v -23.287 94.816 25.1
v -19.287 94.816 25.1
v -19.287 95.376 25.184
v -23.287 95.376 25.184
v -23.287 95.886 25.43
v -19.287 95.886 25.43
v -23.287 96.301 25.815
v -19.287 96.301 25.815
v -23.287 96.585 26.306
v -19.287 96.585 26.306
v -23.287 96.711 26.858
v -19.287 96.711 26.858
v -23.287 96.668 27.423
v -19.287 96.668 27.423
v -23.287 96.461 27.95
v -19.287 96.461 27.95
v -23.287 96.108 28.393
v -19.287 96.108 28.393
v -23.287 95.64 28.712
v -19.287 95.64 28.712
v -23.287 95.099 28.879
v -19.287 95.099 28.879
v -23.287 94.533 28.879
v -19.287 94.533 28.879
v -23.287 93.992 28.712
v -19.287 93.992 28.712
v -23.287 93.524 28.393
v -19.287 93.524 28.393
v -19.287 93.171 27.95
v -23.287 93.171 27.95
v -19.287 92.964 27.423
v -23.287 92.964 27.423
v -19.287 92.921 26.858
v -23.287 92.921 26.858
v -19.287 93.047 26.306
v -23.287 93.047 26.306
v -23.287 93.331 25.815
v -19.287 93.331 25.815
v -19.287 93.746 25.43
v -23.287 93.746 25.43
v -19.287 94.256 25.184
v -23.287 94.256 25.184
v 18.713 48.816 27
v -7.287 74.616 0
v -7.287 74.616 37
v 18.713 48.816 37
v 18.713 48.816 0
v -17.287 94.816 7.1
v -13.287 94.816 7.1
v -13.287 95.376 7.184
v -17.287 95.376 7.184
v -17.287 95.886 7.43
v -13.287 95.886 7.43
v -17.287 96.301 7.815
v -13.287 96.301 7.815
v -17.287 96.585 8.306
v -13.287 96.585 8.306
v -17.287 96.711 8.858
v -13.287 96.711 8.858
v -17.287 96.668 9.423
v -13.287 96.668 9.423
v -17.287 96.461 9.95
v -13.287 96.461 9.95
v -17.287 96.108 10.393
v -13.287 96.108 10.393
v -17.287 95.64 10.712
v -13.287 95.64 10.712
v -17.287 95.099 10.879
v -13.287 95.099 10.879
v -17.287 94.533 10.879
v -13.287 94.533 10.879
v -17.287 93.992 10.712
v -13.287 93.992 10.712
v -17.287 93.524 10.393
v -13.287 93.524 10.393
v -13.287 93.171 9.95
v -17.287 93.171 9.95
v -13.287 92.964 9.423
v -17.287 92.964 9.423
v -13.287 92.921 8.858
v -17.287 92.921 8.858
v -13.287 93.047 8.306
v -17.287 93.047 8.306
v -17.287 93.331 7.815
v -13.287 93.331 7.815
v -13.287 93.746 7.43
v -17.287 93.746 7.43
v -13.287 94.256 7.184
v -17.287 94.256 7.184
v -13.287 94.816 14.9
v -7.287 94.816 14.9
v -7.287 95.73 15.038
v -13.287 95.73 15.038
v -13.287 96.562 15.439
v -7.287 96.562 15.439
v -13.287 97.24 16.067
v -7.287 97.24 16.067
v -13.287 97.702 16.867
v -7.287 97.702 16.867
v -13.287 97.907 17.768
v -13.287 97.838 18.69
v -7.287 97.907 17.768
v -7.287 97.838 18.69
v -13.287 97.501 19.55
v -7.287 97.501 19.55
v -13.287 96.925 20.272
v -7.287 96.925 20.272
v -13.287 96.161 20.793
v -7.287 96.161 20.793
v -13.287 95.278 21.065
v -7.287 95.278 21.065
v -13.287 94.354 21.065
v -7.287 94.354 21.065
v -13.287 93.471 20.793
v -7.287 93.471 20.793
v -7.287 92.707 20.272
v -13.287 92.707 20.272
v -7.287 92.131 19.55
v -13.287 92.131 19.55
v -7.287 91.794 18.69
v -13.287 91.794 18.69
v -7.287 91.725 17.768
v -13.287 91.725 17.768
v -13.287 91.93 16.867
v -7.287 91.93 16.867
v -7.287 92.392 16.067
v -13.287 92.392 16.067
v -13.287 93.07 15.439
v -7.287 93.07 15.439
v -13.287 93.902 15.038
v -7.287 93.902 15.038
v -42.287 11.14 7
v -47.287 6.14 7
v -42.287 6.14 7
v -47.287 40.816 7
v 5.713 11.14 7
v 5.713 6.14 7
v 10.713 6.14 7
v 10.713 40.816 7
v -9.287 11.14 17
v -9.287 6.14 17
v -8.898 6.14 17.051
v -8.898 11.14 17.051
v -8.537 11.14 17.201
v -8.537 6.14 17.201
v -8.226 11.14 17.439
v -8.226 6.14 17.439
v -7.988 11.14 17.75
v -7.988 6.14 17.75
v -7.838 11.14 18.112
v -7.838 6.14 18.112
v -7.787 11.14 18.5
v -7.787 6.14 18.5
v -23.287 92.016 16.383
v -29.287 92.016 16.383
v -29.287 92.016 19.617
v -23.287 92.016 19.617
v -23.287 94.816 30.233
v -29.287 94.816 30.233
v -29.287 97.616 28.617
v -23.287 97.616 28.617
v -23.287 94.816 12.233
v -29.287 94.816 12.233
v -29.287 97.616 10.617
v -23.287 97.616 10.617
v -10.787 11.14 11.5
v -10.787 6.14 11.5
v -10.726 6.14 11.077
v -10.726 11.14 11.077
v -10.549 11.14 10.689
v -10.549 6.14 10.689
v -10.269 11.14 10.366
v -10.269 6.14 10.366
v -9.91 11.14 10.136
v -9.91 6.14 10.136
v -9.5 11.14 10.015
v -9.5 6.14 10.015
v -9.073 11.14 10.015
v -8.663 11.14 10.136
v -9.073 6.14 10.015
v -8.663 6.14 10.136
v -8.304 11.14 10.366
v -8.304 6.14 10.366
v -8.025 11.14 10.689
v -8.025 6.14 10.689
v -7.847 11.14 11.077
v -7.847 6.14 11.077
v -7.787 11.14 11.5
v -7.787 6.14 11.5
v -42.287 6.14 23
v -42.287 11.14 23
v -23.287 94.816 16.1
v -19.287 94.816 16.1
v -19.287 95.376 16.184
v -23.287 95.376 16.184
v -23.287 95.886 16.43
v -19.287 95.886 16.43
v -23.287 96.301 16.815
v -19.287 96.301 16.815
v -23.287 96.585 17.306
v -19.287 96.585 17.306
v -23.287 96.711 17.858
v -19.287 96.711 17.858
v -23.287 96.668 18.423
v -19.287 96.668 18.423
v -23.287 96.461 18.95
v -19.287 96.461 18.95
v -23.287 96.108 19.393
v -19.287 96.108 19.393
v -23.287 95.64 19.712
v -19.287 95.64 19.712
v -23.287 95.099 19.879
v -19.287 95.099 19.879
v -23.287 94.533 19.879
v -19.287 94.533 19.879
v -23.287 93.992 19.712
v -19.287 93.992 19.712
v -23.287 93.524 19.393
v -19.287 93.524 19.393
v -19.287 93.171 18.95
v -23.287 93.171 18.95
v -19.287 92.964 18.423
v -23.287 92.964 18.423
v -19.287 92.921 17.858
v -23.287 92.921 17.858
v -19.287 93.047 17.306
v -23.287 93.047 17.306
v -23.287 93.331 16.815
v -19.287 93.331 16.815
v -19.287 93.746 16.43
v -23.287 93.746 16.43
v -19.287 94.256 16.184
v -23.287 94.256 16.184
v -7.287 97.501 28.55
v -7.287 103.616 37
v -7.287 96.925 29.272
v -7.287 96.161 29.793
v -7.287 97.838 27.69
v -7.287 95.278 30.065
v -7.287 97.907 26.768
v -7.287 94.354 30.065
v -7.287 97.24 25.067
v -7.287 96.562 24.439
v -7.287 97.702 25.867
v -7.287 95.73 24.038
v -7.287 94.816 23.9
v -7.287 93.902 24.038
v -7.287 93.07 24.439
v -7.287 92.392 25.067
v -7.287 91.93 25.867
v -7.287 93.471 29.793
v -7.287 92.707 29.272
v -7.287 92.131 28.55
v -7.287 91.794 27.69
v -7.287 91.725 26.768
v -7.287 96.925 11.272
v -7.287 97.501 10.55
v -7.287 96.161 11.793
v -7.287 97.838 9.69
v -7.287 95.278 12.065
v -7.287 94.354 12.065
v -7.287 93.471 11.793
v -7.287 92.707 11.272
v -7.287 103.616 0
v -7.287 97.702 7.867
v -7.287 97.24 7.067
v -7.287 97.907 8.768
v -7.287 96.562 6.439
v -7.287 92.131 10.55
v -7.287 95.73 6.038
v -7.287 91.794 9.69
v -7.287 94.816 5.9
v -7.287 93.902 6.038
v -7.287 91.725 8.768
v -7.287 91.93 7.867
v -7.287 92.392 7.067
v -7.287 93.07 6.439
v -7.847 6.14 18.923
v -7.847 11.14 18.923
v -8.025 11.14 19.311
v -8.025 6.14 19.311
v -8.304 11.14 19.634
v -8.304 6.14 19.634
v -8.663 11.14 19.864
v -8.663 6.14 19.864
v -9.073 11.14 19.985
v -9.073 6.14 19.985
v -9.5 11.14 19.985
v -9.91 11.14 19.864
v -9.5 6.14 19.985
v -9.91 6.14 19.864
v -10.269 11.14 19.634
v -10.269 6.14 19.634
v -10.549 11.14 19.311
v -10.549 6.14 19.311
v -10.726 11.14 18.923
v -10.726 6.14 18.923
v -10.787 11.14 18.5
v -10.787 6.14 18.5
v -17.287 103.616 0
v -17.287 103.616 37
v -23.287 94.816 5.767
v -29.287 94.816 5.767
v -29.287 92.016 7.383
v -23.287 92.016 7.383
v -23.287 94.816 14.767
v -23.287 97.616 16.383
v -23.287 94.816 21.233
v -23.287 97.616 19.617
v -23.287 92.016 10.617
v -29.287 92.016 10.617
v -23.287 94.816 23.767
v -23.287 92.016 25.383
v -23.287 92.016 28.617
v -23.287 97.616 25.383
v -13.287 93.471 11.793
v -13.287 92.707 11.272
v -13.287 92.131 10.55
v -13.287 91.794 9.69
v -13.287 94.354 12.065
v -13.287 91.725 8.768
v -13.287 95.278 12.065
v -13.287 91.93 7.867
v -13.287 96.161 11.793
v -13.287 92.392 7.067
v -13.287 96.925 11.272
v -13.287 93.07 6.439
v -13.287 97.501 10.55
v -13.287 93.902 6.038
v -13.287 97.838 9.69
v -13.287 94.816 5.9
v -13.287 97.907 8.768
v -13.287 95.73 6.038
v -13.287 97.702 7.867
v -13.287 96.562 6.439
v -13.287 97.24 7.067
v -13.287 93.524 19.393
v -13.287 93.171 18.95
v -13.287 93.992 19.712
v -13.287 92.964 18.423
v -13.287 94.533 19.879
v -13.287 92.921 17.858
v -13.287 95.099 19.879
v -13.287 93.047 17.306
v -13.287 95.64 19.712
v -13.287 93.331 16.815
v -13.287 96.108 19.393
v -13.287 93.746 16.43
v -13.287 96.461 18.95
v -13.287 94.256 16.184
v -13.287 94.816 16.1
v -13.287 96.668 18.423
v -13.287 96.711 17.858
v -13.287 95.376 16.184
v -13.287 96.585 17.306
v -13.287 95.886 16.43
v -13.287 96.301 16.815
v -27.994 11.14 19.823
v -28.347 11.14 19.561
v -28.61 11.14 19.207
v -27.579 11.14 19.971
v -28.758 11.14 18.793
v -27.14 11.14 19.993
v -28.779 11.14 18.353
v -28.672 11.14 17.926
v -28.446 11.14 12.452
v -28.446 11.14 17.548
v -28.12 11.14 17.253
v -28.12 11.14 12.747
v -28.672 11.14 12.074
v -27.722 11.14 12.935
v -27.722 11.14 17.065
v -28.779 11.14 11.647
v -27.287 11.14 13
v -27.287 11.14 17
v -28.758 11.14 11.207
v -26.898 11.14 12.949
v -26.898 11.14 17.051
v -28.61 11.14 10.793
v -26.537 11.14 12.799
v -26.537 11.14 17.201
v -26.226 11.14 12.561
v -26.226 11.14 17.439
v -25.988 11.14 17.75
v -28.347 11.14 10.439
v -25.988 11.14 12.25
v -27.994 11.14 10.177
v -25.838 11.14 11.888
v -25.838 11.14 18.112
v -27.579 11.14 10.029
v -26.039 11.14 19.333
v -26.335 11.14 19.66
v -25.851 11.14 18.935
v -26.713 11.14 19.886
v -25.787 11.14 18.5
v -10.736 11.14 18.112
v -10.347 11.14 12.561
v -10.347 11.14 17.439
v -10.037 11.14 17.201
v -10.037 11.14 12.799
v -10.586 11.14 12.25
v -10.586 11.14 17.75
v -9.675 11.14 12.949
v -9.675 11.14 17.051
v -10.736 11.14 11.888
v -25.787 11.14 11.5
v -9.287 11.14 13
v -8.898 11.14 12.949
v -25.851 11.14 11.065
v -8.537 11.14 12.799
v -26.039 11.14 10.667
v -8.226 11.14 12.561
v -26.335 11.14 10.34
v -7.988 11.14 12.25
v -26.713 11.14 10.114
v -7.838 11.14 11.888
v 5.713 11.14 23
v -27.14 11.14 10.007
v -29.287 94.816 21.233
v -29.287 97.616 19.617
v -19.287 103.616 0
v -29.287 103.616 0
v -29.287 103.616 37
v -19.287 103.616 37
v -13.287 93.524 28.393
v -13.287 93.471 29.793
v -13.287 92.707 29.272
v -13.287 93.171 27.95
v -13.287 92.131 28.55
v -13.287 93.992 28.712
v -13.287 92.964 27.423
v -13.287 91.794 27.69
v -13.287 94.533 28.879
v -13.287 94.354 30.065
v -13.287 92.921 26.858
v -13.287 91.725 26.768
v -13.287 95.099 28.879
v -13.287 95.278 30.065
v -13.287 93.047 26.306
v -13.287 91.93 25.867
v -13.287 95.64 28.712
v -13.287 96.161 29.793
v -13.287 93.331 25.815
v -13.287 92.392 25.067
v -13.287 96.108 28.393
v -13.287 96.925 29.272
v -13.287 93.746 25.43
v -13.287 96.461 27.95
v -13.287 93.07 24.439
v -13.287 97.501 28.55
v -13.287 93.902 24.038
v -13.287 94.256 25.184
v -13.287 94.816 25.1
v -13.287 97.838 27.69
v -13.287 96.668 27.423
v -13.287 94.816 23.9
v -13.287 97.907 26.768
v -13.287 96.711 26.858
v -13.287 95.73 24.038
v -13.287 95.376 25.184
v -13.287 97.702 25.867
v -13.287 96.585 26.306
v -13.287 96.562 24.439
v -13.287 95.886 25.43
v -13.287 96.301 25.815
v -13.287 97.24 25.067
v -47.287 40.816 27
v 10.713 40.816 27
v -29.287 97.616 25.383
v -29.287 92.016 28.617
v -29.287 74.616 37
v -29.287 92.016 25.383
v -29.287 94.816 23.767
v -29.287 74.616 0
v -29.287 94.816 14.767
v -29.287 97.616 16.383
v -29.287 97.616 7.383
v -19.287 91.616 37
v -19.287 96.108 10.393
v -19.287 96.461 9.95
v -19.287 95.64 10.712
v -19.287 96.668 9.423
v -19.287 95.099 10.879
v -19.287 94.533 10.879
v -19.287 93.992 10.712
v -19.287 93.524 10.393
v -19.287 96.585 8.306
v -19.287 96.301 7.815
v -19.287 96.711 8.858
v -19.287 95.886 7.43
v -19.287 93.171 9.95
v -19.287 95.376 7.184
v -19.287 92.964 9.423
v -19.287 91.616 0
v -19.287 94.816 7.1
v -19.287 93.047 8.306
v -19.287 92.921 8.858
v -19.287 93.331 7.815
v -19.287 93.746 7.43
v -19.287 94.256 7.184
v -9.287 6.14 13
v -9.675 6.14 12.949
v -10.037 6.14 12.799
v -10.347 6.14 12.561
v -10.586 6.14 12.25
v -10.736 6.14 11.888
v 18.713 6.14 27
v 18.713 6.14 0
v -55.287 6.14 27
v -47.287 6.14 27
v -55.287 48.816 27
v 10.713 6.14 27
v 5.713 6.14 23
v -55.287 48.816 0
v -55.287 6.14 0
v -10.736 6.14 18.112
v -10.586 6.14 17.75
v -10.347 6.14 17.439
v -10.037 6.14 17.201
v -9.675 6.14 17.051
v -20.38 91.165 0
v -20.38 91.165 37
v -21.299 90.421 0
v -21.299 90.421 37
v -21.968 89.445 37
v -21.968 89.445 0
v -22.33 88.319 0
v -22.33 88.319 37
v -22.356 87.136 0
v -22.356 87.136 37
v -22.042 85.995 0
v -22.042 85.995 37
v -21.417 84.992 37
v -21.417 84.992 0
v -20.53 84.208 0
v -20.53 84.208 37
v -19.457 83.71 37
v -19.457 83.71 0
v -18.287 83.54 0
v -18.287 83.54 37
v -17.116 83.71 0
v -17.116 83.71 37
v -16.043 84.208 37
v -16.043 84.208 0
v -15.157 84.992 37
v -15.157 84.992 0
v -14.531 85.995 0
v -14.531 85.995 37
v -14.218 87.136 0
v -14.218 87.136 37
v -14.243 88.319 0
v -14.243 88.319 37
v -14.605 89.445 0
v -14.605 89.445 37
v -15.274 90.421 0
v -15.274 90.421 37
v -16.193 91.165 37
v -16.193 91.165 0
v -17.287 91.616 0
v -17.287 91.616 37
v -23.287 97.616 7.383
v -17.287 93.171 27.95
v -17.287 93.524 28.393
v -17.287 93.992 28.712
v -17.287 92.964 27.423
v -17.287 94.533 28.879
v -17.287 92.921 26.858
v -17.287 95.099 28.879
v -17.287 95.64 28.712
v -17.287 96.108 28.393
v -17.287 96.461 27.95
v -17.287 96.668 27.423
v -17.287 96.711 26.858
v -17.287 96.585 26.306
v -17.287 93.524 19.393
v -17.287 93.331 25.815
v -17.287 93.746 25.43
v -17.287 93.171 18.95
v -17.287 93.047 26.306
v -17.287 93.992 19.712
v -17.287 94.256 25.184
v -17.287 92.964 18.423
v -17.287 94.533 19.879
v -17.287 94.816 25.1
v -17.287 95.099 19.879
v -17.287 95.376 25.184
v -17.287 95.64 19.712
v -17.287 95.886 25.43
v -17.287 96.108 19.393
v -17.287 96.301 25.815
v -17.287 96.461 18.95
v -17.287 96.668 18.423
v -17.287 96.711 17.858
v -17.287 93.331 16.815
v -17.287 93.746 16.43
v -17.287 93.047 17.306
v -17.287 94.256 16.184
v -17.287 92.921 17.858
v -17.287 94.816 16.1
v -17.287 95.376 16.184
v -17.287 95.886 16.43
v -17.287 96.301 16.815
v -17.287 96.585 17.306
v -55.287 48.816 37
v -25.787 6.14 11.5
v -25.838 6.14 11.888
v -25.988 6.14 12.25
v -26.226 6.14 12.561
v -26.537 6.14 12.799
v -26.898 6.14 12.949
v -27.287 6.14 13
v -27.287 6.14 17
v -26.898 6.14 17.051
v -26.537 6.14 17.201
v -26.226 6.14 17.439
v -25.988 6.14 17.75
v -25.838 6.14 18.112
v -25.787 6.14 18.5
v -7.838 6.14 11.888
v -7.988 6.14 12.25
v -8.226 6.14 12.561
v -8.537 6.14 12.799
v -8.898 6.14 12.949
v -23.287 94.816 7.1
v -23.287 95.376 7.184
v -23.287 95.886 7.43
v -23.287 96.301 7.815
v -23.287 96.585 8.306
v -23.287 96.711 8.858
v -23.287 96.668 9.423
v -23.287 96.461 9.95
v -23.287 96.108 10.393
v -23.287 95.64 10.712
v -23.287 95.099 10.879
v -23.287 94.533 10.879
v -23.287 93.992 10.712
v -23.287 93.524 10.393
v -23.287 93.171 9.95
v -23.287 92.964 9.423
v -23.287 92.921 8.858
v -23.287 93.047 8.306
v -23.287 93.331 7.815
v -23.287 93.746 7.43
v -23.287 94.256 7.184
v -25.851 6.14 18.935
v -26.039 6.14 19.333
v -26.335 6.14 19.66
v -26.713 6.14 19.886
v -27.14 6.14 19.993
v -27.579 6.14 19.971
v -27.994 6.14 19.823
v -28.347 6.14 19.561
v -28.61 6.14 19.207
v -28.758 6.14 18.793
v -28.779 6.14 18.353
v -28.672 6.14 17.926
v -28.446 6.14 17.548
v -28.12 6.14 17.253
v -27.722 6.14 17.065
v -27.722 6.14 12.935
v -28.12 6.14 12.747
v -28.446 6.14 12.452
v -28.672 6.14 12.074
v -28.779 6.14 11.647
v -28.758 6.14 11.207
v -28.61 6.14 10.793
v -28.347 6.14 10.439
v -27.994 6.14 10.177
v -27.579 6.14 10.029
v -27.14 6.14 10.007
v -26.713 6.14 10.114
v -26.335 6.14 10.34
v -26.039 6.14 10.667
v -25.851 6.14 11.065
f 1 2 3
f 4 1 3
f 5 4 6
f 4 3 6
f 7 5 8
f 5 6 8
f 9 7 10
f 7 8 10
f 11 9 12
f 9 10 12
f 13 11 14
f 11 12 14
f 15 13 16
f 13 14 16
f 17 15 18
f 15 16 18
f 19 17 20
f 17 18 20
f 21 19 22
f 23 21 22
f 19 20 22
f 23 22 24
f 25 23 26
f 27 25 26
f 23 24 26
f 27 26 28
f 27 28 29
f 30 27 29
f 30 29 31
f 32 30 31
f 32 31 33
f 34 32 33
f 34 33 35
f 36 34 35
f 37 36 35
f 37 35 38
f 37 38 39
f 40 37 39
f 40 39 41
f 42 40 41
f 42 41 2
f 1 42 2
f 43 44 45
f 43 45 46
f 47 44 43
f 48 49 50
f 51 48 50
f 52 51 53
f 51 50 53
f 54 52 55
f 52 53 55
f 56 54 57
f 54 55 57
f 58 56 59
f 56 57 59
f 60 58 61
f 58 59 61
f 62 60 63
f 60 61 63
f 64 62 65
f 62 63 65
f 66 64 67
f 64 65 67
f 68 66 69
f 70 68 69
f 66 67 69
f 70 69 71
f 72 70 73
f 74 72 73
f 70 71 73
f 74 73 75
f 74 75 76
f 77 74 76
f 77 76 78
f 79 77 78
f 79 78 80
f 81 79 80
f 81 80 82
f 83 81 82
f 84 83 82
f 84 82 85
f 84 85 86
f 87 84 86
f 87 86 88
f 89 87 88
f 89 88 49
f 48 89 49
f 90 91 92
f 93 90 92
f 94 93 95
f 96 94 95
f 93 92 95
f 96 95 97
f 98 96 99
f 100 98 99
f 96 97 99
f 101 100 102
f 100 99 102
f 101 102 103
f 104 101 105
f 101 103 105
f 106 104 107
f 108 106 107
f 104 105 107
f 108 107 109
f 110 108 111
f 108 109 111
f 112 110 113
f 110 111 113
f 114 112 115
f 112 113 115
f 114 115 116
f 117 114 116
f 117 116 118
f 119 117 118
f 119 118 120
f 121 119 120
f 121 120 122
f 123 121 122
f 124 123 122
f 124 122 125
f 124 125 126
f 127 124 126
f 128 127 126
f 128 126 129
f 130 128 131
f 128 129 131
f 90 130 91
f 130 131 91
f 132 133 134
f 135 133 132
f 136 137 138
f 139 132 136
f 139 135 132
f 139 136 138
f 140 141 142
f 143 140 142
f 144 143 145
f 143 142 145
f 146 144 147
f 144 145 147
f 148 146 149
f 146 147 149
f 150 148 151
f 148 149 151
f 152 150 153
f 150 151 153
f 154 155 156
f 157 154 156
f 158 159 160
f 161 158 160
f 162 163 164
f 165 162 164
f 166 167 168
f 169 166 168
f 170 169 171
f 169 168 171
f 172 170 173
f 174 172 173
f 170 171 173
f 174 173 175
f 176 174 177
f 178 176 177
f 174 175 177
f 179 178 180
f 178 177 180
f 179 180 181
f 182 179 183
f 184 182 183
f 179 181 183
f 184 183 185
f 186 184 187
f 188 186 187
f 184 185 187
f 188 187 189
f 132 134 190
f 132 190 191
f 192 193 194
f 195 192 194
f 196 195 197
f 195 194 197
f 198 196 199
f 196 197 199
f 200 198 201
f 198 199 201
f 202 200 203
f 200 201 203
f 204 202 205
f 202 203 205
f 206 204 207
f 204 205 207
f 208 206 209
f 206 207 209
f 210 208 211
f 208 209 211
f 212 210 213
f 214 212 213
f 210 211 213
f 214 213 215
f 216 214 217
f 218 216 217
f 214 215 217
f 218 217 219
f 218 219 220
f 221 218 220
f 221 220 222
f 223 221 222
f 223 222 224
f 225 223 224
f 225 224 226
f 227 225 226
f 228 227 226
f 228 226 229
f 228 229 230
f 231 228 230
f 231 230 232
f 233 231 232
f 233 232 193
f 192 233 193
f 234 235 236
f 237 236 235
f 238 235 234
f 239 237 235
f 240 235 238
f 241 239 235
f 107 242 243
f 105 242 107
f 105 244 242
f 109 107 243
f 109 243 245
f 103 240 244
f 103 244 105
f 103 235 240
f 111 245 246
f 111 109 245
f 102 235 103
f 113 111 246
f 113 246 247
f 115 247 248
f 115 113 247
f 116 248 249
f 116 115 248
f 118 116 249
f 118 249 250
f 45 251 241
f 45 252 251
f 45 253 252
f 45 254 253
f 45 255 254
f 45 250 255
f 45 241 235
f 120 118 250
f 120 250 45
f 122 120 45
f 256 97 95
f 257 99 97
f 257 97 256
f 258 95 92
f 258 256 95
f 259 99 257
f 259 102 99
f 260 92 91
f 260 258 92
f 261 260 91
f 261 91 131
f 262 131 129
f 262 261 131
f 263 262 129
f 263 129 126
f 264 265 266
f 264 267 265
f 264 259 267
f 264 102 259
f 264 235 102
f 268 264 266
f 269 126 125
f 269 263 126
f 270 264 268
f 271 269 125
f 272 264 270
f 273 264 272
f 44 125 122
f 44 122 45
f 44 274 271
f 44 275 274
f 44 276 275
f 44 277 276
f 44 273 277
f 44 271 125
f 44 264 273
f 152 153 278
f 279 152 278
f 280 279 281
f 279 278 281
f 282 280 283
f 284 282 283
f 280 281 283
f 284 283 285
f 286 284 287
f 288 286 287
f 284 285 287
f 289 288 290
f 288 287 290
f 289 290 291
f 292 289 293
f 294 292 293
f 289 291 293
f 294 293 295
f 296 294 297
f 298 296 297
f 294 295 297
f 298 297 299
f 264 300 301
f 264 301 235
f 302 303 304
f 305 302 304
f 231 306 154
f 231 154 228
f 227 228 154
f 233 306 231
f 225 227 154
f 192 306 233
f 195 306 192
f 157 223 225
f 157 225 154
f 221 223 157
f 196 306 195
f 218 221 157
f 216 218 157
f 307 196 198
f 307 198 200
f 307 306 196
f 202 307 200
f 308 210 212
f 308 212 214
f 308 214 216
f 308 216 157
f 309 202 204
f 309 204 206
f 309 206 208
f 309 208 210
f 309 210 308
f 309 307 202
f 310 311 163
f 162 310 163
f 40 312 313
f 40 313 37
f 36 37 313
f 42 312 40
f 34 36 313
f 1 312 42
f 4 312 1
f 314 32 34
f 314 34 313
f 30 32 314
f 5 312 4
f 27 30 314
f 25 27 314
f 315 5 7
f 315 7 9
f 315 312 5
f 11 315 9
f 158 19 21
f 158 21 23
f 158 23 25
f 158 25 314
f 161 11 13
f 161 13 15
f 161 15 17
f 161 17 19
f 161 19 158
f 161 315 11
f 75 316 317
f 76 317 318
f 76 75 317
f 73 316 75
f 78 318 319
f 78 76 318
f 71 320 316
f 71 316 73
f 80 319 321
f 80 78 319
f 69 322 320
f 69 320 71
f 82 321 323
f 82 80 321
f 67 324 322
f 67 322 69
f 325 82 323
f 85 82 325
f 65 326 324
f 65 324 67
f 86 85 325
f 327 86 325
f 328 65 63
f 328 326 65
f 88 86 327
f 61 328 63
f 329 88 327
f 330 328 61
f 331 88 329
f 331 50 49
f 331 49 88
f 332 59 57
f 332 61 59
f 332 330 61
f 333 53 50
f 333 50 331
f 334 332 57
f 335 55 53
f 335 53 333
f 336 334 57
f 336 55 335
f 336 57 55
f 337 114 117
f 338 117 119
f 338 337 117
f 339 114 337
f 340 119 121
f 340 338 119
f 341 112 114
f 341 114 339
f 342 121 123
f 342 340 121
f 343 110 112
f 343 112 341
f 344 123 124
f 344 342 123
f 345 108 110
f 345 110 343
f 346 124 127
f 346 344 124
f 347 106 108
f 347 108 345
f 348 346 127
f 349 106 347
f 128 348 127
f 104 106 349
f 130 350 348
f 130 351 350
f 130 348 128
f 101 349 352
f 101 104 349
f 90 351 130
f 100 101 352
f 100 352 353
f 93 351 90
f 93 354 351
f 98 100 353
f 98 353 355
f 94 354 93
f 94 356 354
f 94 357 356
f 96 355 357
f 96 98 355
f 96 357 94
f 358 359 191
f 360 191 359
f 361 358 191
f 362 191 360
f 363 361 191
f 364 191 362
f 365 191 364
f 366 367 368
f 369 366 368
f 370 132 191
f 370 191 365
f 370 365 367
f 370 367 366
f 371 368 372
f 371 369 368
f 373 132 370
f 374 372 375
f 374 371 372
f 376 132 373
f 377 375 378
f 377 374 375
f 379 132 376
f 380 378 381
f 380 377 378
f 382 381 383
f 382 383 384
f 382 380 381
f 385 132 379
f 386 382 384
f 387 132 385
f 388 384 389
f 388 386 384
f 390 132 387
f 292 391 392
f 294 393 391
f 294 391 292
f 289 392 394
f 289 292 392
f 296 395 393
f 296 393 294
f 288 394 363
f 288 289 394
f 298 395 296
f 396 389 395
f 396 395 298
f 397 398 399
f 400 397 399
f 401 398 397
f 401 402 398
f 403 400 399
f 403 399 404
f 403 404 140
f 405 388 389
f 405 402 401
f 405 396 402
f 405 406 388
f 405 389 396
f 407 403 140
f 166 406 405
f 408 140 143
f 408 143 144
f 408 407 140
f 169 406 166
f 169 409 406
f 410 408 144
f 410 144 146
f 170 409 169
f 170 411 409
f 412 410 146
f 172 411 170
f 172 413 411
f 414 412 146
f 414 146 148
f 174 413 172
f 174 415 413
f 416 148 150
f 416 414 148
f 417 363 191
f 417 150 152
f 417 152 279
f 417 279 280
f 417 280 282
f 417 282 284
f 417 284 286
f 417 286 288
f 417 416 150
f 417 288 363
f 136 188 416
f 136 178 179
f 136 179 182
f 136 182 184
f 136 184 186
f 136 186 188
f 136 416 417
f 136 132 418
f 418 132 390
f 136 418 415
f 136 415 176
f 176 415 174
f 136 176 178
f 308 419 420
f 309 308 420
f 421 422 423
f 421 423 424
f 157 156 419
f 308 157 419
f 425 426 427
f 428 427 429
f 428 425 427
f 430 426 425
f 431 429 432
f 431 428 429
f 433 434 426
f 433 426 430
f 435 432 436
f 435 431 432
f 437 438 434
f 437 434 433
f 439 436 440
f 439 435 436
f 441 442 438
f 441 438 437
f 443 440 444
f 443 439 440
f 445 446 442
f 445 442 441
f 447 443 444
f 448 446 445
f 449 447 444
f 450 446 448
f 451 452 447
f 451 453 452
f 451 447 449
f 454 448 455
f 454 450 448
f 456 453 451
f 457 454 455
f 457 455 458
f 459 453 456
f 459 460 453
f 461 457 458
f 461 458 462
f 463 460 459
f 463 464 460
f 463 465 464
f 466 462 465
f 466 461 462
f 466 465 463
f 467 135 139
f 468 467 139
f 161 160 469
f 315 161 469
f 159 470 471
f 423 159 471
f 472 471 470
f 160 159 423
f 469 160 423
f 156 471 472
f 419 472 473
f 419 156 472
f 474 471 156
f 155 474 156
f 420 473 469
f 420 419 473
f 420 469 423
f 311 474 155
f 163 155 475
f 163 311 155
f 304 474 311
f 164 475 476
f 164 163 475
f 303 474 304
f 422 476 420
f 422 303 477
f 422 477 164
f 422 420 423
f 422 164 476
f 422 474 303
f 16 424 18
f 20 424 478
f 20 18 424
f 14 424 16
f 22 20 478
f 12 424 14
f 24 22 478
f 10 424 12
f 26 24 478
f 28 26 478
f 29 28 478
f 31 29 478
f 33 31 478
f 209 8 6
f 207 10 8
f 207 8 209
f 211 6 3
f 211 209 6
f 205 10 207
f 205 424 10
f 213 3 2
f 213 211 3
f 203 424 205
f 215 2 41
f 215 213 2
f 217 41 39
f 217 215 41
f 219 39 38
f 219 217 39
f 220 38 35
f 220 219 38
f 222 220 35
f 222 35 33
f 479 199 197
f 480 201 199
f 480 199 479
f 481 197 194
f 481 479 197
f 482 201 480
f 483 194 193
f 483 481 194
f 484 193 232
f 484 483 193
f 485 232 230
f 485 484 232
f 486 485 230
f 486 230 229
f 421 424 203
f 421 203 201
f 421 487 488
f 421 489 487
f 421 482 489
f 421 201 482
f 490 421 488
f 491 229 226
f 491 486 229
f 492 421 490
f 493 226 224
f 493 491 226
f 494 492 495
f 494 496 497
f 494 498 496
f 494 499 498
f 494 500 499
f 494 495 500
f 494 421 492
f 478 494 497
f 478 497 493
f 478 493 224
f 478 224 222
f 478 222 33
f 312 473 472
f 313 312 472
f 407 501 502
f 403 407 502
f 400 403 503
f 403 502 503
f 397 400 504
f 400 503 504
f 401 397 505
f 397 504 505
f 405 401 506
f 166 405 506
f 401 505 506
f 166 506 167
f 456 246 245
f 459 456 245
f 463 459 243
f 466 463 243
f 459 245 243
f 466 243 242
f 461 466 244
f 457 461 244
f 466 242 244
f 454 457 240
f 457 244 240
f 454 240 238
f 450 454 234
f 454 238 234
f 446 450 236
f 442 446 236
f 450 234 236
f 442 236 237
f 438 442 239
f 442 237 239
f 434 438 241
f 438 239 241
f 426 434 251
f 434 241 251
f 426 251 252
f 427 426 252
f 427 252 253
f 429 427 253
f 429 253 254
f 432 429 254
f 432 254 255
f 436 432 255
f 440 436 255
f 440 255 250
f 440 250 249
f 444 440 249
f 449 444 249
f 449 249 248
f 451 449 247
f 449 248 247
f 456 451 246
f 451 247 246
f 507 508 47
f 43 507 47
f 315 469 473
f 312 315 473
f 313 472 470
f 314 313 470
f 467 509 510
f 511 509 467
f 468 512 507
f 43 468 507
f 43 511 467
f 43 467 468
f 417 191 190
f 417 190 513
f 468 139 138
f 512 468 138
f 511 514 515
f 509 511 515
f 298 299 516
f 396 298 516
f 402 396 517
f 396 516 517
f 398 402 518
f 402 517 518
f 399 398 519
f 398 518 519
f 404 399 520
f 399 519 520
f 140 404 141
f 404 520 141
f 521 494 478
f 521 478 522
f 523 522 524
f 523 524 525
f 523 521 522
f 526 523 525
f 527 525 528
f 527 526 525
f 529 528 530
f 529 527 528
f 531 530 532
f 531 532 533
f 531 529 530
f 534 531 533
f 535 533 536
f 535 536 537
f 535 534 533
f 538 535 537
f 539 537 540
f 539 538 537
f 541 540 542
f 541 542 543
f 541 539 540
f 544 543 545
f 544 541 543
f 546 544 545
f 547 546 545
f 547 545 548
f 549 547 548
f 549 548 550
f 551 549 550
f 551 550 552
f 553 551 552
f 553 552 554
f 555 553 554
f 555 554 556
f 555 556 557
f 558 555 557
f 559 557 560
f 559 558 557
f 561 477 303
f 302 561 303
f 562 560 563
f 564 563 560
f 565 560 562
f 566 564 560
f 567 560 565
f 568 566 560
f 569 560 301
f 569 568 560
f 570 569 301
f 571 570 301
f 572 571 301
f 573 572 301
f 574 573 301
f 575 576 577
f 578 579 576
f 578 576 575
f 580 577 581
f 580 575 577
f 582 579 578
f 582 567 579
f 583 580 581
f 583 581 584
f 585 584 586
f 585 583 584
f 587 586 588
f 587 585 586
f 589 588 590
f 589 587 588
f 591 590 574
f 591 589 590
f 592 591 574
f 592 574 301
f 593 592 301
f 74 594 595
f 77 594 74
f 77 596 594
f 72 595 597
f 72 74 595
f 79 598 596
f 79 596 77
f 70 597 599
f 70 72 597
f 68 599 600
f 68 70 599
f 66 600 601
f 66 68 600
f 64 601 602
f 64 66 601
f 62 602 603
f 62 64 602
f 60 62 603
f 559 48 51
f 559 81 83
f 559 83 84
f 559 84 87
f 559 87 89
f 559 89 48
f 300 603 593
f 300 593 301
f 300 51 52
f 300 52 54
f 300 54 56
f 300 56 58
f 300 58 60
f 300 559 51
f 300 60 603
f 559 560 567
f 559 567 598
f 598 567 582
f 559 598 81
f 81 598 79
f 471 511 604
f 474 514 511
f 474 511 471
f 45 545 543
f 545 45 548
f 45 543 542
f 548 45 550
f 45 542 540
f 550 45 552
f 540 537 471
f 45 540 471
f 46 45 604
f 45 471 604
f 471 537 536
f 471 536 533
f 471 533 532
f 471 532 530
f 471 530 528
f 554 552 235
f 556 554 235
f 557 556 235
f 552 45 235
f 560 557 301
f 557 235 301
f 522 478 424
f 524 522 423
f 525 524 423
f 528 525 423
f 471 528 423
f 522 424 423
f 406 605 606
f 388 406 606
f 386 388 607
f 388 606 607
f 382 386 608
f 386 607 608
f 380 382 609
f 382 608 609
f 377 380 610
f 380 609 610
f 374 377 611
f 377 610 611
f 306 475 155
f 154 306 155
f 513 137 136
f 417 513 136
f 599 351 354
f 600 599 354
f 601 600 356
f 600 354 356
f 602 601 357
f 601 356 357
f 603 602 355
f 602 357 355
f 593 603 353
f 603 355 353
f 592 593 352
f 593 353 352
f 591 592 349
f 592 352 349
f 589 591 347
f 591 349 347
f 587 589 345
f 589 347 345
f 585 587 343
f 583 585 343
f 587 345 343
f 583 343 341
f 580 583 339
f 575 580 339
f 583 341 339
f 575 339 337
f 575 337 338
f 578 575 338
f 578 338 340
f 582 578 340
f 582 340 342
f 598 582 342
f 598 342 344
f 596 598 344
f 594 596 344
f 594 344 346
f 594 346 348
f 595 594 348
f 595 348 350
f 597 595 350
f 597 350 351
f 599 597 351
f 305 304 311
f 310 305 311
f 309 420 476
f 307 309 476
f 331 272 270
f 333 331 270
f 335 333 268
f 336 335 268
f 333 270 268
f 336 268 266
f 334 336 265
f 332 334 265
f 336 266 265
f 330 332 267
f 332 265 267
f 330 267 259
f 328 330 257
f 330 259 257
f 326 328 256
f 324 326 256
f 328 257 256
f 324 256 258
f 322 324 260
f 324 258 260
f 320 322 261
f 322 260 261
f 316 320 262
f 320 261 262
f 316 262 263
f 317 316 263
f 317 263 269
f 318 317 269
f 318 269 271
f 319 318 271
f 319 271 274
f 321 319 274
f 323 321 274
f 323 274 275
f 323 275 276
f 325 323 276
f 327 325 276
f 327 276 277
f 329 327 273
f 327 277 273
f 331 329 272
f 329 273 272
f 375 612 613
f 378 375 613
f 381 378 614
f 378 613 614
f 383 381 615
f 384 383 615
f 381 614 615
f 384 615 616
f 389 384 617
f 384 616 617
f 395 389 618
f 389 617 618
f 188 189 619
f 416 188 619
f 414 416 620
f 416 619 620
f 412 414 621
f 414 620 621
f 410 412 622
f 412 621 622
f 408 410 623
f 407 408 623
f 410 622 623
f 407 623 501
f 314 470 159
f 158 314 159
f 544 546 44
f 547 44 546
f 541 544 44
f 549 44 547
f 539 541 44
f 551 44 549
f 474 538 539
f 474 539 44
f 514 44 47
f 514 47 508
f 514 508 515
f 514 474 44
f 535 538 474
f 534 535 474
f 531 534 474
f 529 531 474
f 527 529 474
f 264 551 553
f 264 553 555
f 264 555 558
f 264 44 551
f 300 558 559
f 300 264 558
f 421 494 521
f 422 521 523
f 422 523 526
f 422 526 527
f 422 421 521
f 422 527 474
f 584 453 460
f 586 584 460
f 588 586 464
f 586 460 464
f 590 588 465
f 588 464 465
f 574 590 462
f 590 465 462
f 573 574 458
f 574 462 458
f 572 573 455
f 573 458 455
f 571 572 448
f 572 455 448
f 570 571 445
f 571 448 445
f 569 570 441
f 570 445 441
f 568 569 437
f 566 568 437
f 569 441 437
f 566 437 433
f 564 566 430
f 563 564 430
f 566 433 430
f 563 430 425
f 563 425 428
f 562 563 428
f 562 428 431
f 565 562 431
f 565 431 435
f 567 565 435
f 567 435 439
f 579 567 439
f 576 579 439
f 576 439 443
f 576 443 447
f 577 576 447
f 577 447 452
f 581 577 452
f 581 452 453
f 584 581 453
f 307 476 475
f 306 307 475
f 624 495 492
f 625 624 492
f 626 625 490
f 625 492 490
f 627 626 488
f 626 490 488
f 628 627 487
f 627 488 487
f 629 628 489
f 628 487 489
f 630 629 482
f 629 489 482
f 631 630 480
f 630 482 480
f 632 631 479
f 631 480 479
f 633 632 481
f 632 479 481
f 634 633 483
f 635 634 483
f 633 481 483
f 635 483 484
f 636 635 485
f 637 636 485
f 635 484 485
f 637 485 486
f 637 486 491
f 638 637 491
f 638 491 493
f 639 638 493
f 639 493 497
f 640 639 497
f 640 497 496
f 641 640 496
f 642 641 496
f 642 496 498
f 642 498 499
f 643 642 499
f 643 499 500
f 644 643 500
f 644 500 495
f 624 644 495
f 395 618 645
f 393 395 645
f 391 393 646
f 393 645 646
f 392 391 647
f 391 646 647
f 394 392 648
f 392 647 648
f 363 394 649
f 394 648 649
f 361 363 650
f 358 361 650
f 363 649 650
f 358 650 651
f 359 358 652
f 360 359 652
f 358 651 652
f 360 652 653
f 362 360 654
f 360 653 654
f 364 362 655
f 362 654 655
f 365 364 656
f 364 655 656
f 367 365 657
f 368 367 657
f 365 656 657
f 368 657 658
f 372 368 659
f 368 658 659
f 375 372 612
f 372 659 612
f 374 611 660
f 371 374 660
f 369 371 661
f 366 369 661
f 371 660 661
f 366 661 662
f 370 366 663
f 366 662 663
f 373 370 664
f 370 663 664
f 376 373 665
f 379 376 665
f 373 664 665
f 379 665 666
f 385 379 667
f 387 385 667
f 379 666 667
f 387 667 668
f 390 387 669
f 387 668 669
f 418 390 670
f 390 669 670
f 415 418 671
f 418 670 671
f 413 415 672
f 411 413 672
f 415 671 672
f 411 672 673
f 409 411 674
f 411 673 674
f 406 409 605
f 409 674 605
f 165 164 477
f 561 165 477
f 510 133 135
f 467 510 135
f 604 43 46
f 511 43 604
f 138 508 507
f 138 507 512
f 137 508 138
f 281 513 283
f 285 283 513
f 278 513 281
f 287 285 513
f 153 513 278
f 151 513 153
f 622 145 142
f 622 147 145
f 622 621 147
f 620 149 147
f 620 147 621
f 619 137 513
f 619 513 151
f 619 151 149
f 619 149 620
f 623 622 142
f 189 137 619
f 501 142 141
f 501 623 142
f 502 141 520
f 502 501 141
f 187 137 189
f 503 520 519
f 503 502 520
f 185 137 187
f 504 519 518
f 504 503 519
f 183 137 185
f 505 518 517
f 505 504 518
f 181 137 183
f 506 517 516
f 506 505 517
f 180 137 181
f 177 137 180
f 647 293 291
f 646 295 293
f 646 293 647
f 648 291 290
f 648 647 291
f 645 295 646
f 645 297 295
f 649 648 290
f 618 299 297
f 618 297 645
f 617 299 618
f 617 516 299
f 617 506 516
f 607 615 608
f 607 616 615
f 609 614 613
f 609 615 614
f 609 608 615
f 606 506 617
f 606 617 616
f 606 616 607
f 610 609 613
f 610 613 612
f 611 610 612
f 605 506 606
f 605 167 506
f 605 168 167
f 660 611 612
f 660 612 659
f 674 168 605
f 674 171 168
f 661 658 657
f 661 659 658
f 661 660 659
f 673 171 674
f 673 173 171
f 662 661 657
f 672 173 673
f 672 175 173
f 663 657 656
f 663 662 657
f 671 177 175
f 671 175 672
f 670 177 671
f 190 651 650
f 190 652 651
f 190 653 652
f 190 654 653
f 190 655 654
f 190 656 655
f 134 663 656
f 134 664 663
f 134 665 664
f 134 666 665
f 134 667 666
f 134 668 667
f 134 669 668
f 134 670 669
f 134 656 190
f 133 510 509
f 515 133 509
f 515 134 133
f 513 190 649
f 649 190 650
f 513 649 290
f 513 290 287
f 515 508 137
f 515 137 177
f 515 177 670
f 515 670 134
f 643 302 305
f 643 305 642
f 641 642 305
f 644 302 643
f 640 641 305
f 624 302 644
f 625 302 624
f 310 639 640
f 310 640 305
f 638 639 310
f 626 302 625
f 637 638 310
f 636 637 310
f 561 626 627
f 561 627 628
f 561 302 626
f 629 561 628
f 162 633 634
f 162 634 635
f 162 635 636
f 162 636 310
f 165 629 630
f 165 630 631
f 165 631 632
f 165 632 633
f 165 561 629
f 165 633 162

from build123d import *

# Parameters (mm, degrees)
SALIENTE_EXTRUIR1_DEPTH = 7
SALIENTE_EXTRUIR3_DEPTH = 27
SALIENTE_EXTRUIR5_DEPTH = 37
CROQUIS10_R             = 1.9
CORTAR_EXTRUIR3_DEPTH   = 22
CROQUIS11_R             = 3.1
CORTAR_EXTRUIR4_DEPTH   = 6
CORTAR_EXTRUIR5_DEPTH   = 6
CORTAR_EXTRUIR6_START   = -7
CORTAR_EXTRUIR6_DEPTH   = 7
CROQUIS17_4_W           = 8
CROQUIS17_4_H           = 11.32382093
CORTAR_EXTRUIR7_DEPTH   = 20
SALIENTE_EXTRUIR6_DEPTH = 16
CROQUIS18_R             = 1.5
CORTAR_EXTRUIR8_DEPTH   = 10


with BuildPart() as part:
    # Croquis2 → Saliente-Extruir1 (new body)
    with BuildSketch(Plane.XY):
        with BuildLine():
            Line((-47.286620614, 40.816010109), (-47.286620614, -49.183989891))
            ThreePointArc((-47.286620614, -49.183989891), (-45.236368082, -54.133737359), (-40.286620614, -56.183989891))
            Line((-40.286620614, -56.183989891), (3.713379386, -56.183989891))
            ThreePointArc((3.713379386, -56.183989891), (8.663126854, -54.133737359), (10.713379386, -49.183989891))
            Line((10.713379386, -49.183989891), (10.713379386, 40.816010109))
            Line((10.713379386, 40.816010109), (-47.286620614, 40.816010109))
        make_face()
    extrude(amount=SALIENTE_EXTRUIR1_DEPTH)

    # Croquis2<7> → Saliente-Extruir3 (add)
    with BuildSketch(Plane.XY):
        Polygon((-55.286620614, 48.816010109), (-55.286620614, -5.183989891), (-47.286620614, -5.183989891), (-47.286620614, 40.816010109), (10.713379386, 40.816010109), (10.713379386, -5.183989891), (18.713379386, -5.183989891), (18.713379386, 48.816010109), align=None)
    extrude(amount=SALIENTE_EXTRUIR3_DEPTH)

    # Croquis2<14> → Saliente-Extruir5 (add)
    with BuildSketch(Plane.XY):
        with BuildLine():
            Line((-55.286620614, 48.816010109), (-30.786620614, 48.816010109))
            Line((-30.786620614, 48.816010109), (-5.786620614, 48.816010109))
            Line((-5.786620614, 48.816010109), (18.713379386, 48.816010109))
            Line((18.713379386, 48.816010109), (-7.286620614, 74.616010109))
            Line((-7.286620614, 74.616010109), (-7.286620614, 103.616010109))
            Line((-7.286620614, 103.616010109), (-17.286620614, 103.616010109))
            Line((-17.286620614, 103.616010109), (-17.286620614, 91.616010109))
            ThreePointArc((-17.286620614, 91.616010109), (-18.286620614, 83.539831039), (-19.286620614, 91.616010109))
            Line((-19.286620614, 91.616010109), (-19.286620614, 103.616010109))
            Line((-19.286620614, 103.616010109), (-29.286620614, 103.616010109))
            Line((-29.286620614, 103.616010109), (-29.286620614, 74.616010109))
            Line((-29.286620614, 74.616010109), (-55.286620614, 48.816010109))
        make_face()
    extrude(amount=SALIENTE_EXTRUIR5_DEPTH)

    # Croquis10 → Cortar-Extruir3 (cut)
    with BuildSketch(Plane(origin=(-7.286620614, 0, 0), x_dir=(0, 0, -1), z_dir=(1, 0, 0))):
        with Locations((-9, 94.816010109)):
            Circle(CROQUIS10_R)
        with Locations((-18, 94.816010109)):
            Circle(CROQUIS10_R)
        with Locations((-27, 94.816010109)):
            Circle(CROQUIS10_R)
    extrude(amount=-CORTAR_EXTRUIR3_DEPTH, mode=Mode.SUBTRACT)

    # Croquis11 → Cortar-Extruir4 (cut)
    with BuildSketch(Plane(origin=(-7.286620614, 0, 0), x_dir=(0, 0, -1), z_dir=(1, 0, 0))):
        with Locations((-27, 94.816010109)):
            Circle(CROQUIS11_R)
        with Locations((-18, 94.816010109)):
            Circle(CROQUIS11_R)
        with Locations((-9, 94.816010109)):
            Circle(CROQUIS11_R)
    extrude(amount=-CORTAR_EXTRUIR4_DEPTH, mode=Mode.SUBTRACT)

    # Croquis12 → Cortar-Extruir5 (cut)
    with BuildSketch(Plane.ZY.offset(29.286620614)):
        Polygon((21.233161507, 94.816010109), (19.616580754, 97.616010109), (16.383419246, 97.616010109), (14.766838493, 94.816010109), (16.383419246, 92.016010109), (19.616580754, 92.016010109), align=None)
        Polygon((12.233161507, 94.816010109), (10.616580754, 97.616010109), (7.383419246, 97.616010109), (5.766838493, 94.816010109), (7.383419246, 92.016010109), (10.616580754, 92.016010109), align=None)
        Polygon((30.233161507, 94.816010109), (28.616580754, 97.616010109), (25.383419246, 97.616010109), (23.766838493, 94.816010109), (25.383419246, 92.016010109), (28.616580754, 92.016010109), align=None)
    extrude(amount=-CORTAR_EXTRUIR5_DEPTH, mode=Mode.SUBTRACT)

    # Croquis17 → Cortar-Extruir6 (cut)
    with BuildSketch(Plane.XY.offset(7).offset(CORTAR_EXTRUIR6_START)):
        with BuildLine():
            Line((-55.286620614, 6.139831039), (-55.286620614, -5.183989891))
            Line((-55.286620614, -5.183989891), (-47.286620614, -5.183989891))
            Line((-47.286620614, -5.183989891), (-47.286620614, -49.183989891))
            ThreePointArc((-47.286620614, -49.183989891), (-45.236368082, -54.133737359), (-40.286620614, -56.183989891))
            Line((-40.286620614, -56.183989891), (3.713379386, -56.183989891))
            ThreePointArc((3.713379386, -56.183989891), (8.663126854, -54.133737359), (10.713379386, -49.183989891))
            Line((10.713379386, -49.183989891), (10.713379386, -5.183989891))
            Line((10.713379386, -5.183989891), (18.713379386, -5.183989891))
            Line((18.713379386, -5.183989891), (18.713379386, 6.139831039))
            Line((18.713379386, 6.139831039), (-55.286620614, 6.139831039))
        make_face()
    extrude(amount=CORTAR_EXTRUIR6_DEPTH, mode=Mode.SUBTRACT)

    # Croquis17<4> → Cortar-Extruir7 (cut)
    with BuildSketch(Plane.XY.offset(7)):
        with Locations((-51.286620614, 0.477920574)):
            Rectangle(CROQUIS17_4_W, CROQUIS17_4_H)
        with Locations((14.713379386, 0.477920574)):
            Rectangle(CROQUIS17_4_W, CROQUIS17_4_H)
    extrude(amount=CORTAR_EXTRUIR7_DEPTH, mode=Mode.SUBTRACT)

    # Croquis17<5> → Saliente-Extruir6 (add)
    with BuildSketch(Plane.XY.offset(7)):
        Polygon((-42.286620614, 6.139831039), (-18.286620614, 6.139831039), (5.713379386, 6.139831039), (5.713379386, 11.139831039), (-42.286620614, 11.139831039), align=None)
    extrude(amount=SALIENTE_EXTRUIR6_DEPTH)

    # Croquis18 → Cortar-Extruir8 (cut)
    with BuildSketch(Plane.XZ.offset(-6.139831039)):
        with Locations((-27.286620614, 18.5)):
            Circle(CROQUIS18_R)
        with Locations((-9.286620614, 18.5)):
            Circle(CROQUIS18_R)
        with Locations((-27.286620614, 11.5)):
            Circle(CROQUIS18_R)
        with Locations((-9.286620614, 11.5)):
            Circle(CROQUIS18_R)
    extrude(amount=-CORTAR_EXTRUIR8_DEPTH, mode=Mode.SUBTRACT)


solid = part.part
